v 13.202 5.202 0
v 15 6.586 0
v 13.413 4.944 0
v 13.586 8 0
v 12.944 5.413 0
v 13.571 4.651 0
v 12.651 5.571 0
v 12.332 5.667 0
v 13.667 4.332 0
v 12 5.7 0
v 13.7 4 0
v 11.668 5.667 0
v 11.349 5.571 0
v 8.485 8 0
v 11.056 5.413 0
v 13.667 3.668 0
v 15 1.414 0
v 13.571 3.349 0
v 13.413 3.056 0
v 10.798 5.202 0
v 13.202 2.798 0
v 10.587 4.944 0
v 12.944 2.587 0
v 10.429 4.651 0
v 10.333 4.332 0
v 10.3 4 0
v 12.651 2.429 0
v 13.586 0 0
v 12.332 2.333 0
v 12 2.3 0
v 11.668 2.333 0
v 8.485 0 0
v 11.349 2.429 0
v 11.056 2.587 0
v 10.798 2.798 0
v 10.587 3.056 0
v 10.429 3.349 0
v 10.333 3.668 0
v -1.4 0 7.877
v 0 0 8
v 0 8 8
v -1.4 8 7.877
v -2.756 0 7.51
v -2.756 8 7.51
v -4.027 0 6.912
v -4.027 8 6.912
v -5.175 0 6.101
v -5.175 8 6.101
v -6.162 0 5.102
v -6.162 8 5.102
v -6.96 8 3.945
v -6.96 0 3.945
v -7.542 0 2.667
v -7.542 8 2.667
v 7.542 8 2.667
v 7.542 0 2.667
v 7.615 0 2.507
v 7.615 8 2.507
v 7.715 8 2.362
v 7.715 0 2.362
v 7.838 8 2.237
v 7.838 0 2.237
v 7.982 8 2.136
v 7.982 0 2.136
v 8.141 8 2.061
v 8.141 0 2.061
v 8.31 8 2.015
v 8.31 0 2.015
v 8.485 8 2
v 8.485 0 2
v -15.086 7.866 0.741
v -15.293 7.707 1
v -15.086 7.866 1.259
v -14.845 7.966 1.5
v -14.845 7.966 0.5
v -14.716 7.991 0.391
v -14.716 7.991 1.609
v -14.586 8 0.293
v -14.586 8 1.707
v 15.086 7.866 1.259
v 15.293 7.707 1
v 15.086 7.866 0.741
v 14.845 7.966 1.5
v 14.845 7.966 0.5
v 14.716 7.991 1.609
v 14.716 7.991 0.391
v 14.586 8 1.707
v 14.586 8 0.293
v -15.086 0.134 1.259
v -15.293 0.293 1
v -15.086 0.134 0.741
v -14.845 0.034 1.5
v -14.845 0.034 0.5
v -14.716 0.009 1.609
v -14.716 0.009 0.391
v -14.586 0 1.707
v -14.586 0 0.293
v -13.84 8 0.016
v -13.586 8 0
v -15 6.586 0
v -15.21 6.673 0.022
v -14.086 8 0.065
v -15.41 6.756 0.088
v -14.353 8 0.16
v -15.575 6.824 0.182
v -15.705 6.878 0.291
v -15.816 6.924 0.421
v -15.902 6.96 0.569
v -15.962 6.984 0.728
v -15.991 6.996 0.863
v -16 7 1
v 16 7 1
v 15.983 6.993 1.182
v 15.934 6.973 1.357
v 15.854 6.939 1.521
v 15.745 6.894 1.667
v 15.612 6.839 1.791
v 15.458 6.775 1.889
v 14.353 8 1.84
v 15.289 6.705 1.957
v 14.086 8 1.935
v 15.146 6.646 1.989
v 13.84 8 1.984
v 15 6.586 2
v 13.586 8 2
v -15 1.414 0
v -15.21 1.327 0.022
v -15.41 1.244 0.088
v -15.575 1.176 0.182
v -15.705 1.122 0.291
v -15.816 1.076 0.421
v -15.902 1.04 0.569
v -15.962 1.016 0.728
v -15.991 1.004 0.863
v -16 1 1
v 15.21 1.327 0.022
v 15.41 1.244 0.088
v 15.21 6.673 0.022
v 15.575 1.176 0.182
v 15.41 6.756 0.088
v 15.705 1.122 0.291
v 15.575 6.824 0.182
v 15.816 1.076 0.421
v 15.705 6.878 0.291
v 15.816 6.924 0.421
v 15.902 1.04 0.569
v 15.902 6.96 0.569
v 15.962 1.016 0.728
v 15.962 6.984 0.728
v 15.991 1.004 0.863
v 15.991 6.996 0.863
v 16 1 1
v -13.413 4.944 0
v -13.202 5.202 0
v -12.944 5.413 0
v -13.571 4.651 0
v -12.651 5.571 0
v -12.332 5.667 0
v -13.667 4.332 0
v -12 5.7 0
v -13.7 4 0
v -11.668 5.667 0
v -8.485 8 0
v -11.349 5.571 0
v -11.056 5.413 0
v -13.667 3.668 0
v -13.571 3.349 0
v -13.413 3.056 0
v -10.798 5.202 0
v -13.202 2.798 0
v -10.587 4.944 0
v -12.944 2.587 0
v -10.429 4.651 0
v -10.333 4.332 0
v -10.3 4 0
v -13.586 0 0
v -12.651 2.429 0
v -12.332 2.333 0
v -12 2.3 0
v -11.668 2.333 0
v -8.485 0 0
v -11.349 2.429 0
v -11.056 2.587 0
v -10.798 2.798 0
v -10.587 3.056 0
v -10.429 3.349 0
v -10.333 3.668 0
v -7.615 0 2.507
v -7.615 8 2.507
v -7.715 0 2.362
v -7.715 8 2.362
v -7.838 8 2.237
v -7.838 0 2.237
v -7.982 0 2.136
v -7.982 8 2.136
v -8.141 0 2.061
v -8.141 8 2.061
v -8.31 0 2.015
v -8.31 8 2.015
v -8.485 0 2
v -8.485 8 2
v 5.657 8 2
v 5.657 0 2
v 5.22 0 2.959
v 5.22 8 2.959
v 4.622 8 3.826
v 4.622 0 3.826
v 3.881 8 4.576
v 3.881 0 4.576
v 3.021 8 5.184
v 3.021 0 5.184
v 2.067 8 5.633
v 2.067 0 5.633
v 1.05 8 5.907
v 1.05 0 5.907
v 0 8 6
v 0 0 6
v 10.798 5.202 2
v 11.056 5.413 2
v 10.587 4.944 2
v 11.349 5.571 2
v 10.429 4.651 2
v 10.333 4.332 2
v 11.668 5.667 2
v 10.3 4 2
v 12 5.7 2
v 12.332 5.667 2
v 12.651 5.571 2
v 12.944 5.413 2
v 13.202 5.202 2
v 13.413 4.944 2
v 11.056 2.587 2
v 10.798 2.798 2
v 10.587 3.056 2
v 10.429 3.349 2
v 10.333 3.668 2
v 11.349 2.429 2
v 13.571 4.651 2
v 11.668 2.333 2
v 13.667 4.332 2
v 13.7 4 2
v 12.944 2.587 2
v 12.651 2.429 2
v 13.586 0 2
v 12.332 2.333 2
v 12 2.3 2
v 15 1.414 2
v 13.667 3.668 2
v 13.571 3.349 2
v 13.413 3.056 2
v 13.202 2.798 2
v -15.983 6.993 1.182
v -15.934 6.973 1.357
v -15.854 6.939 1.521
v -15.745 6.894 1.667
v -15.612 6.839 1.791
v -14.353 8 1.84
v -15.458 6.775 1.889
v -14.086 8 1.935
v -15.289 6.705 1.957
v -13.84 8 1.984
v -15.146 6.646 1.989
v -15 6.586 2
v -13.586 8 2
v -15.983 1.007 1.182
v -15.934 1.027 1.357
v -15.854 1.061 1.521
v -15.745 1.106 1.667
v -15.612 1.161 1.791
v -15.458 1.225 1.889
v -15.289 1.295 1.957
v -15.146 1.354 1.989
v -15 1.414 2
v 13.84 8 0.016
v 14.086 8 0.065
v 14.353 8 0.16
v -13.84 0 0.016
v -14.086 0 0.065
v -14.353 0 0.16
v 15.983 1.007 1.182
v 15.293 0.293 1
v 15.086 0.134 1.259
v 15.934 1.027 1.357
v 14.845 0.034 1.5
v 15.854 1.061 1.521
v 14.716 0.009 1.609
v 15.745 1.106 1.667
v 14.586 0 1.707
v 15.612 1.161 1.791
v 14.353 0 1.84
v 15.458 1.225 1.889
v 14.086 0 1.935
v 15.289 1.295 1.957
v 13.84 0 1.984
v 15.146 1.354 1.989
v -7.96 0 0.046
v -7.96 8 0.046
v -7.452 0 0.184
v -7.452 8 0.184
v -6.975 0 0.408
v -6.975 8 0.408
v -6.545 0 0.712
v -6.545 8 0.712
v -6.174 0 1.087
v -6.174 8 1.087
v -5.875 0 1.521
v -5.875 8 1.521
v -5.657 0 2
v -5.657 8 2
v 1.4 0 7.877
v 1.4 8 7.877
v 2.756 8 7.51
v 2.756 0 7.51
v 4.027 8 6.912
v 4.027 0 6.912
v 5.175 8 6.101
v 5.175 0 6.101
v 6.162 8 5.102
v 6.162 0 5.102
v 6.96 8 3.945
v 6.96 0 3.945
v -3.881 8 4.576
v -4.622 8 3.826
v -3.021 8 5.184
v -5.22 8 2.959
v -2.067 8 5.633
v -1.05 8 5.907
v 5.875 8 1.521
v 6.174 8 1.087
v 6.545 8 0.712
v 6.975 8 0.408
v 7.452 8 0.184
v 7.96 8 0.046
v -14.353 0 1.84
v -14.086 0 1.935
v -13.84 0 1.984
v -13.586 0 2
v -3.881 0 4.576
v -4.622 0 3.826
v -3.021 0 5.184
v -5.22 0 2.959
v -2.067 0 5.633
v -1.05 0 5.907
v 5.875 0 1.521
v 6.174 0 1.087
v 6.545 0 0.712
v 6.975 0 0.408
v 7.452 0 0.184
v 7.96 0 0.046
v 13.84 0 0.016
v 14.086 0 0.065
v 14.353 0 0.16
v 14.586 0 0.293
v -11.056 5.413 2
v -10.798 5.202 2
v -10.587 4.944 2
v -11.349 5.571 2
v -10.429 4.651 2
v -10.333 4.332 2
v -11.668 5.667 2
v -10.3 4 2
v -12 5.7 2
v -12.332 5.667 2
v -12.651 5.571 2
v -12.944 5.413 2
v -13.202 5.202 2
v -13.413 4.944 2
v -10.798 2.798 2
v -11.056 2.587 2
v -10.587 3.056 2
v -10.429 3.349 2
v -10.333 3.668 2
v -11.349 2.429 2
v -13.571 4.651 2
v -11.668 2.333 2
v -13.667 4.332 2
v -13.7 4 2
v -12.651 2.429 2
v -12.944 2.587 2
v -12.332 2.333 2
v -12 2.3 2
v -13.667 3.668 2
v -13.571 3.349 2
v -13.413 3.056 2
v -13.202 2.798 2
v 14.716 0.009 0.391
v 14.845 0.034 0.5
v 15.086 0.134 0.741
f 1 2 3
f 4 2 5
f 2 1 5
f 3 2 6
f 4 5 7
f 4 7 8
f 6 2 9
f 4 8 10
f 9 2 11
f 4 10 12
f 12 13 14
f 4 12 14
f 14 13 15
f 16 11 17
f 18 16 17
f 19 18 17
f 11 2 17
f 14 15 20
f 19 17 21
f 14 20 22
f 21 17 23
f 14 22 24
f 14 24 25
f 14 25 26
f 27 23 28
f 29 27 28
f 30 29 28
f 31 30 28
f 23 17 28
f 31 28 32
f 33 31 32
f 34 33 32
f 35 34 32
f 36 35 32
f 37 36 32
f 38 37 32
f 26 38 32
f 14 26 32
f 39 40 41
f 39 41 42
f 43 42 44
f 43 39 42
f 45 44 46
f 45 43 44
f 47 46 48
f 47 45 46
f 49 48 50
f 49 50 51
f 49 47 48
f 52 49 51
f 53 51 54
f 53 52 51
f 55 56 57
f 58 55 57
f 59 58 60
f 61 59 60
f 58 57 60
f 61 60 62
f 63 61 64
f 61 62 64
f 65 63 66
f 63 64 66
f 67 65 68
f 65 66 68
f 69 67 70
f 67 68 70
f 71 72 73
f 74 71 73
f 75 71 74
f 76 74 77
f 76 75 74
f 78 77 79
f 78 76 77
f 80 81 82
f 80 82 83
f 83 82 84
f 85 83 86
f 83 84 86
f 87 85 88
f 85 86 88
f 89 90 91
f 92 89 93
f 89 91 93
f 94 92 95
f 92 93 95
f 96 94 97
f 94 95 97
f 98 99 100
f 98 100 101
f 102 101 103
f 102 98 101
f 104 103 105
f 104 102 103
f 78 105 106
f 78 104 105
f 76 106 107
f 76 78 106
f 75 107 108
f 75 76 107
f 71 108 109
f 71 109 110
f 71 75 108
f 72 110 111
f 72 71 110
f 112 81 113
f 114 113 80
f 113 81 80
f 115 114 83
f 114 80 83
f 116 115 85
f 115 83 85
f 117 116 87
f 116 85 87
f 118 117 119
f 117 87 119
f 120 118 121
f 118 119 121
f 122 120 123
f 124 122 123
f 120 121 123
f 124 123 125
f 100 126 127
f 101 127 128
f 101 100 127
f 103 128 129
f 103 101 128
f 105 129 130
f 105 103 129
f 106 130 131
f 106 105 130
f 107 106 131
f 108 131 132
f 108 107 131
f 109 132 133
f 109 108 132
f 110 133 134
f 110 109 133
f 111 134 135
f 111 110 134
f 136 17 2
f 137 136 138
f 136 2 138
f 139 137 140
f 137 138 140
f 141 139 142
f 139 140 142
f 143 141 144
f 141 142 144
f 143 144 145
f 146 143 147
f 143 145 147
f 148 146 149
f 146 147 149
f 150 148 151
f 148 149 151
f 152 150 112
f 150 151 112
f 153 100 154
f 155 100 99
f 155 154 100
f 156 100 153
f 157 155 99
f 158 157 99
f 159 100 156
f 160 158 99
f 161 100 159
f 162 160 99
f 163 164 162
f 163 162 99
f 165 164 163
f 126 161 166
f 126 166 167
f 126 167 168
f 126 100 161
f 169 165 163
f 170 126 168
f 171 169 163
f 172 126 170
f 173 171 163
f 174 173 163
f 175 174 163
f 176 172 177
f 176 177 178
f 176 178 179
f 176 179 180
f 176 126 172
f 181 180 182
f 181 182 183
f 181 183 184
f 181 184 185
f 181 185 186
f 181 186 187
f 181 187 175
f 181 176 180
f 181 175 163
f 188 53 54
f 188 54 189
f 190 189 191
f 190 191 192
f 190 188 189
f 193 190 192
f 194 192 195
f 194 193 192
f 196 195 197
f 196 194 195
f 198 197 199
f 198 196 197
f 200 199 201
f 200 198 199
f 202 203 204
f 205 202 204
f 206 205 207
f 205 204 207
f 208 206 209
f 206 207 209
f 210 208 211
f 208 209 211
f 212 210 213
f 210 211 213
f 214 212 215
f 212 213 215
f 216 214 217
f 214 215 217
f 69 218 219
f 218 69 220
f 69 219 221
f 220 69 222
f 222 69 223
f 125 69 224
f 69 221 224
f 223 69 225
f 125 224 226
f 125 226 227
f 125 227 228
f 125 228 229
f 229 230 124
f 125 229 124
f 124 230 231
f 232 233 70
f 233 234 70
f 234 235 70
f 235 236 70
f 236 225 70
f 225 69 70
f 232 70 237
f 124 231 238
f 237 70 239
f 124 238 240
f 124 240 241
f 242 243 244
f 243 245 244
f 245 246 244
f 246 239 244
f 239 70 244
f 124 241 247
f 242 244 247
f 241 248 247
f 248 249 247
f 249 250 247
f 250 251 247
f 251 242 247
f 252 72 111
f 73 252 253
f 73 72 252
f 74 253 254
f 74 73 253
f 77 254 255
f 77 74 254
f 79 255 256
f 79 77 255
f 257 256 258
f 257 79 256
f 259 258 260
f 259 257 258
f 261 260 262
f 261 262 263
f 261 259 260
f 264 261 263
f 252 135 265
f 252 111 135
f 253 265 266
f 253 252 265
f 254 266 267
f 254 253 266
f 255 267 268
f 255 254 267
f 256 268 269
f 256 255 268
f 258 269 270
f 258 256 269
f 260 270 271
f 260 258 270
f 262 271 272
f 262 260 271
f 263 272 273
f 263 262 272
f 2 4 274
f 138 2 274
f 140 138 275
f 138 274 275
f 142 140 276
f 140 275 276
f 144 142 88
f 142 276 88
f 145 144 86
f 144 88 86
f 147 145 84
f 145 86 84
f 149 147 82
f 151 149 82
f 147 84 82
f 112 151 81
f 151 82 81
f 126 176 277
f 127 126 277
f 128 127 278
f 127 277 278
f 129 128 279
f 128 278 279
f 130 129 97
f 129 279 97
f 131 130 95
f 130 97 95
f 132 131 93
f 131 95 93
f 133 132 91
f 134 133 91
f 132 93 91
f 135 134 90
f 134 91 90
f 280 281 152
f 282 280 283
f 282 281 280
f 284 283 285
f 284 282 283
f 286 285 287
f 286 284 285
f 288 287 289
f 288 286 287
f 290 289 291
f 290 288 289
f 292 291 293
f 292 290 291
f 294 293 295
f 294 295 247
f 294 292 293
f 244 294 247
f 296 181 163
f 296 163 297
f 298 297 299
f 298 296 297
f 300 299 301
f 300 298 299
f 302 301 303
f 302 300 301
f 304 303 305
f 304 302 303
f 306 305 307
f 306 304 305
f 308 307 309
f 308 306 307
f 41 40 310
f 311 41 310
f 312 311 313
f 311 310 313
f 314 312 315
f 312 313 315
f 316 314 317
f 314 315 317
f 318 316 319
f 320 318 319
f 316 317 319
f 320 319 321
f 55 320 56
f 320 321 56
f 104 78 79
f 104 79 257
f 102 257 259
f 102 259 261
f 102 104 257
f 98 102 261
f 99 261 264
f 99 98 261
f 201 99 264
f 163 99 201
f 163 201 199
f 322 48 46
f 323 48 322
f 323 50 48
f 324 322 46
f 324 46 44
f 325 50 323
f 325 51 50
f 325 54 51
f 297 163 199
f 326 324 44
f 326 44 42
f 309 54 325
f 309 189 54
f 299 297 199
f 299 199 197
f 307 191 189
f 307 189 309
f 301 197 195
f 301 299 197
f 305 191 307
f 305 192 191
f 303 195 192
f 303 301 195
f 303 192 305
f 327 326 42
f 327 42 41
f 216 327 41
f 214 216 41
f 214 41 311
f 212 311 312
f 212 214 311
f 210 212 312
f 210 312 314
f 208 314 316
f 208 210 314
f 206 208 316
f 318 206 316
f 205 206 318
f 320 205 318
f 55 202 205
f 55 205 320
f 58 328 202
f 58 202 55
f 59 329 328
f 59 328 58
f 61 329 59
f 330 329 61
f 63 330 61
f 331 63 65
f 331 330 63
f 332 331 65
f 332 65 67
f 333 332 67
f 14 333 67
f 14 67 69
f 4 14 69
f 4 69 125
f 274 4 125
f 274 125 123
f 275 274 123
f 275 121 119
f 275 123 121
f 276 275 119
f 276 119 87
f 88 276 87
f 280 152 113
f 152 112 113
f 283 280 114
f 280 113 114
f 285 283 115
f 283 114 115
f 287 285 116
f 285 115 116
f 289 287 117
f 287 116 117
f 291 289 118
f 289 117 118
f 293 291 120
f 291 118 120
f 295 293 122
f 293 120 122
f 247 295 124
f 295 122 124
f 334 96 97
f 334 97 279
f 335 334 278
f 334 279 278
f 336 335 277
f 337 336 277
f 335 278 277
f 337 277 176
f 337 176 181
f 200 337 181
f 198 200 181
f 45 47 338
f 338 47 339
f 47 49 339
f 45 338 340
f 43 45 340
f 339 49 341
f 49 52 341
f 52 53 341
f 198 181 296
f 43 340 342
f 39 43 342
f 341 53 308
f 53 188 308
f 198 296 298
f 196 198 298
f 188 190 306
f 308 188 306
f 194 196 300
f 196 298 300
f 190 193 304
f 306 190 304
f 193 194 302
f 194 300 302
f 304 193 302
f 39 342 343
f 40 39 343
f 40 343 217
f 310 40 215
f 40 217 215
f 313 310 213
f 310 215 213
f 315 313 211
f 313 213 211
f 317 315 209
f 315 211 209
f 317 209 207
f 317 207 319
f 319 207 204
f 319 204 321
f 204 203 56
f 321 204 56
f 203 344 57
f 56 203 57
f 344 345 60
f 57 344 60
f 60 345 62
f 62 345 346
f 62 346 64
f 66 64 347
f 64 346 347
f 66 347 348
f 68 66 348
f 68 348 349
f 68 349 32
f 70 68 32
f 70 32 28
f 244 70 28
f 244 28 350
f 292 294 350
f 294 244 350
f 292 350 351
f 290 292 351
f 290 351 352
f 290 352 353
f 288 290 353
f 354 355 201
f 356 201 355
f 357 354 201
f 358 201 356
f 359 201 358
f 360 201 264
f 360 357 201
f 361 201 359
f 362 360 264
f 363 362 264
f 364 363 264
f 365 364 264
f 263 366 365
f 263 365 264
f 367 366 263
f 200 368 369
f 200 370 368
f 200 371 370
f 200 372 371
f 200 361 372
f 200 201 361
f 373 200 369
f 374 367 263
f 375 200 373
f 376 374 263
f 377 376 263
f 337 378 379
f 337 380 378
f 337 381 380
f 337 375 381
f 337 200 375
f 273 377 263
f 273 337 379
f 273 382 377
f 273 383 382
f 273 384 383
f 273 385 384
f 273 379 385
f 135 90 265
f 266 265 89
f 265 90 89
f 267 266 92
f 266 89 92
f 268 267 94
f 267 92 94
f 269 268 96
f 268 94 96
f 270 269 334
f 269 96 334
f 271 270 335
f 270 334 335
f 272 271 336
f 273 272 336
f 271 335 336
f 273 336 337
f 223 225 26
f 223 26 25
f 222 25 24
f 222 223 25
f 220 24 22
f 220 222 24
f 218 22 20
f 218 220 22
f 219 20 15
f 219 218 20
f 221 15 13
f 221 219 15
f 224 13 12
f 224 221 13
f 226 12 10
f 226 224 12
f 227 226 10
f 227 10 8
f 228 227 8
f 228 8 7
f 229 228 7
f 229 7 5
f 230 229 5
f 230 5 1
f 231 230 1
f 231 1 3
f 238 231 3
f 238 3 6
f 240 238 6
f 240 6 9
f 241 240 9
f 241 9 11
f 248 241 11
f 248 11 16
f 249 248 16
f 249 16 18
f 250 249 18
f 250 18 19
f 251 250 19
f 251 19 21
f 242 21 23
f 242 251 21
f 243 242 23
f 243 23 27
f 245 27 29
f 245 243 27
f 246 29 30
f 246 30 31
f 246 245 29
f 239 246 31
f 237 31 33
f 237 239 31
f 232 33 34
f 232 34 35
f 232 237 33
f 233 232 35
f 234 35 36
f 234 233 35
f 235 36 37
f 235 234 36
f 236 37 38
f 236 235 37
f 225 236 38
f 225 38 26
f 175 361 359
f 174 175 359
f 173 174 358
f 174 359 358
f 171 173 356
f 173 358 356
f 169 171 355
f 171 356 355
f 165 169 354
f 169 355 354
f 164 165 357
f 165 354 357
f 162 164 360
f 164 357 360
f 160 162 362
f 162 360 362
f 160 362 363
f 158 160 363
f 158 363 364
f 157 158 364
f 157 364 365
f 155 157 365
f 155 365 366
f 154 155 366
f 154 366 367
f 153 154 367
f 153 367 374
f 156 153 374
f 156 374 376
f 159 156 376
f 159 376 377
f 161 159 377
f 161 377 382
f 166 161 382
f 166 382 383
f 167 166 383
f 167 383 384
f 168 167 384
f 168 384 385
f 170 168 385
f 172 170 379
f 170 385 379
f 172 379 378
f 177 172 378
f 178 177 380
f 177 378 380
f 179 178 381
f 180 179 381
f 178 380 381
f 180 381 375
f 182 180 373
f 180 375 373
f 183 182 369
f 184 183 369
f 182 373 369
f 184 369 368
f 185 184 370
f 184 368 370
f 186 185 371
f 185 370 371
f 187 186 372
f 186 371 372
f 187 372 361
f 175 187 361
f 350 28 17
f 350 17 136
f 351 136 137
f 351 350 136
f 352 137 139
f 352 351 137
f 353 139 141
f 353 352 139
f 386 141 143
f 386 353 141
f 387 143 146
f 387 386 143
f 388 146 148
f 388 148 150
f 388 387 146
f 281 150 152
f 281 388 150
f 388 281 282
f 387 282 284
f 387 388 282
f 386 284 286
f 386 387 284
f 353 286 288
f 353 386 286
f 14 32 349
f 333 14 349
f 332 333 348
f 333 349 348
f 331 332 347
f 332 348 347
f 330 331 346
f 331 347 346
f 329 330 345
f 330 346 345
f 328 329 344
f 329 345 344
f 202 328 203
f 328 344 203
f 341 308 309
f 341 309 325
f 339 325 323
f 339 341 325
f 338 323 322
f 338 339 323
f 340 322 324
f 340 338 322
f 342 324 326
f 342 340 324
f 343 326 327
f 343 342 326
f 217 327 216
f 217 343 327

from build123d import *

# Parameters (mm, degrees)
BOSS_EXTRUDE1_DEPTH = 8
SKETCH2_R           = 1.7
CUT_EXTRUDE1_DEPTH  = 19.867962264
CHAMFER1_SIZE       = 1
FILLET1_R           = 1


with BuildPart() as part:
    # Sketch1 → Boss-Extrude1 (new body)
    with BuildSketch(Plane(origin=(0, 0, 0), x_dir=(1, 0, 0), z_dir=(0, 1, 0))):
        with BuildLine():
            Line((-16, 0), (-8.485281374, 0))
            ThreePointArc((-8.485281374, 0), (-6.753230567, -0.550510257), (-5.656854249, -2))
            ThreePointArc((-5.656854249, -2), (-3.464101615, -4.898979486), (0, -6))
            Line((0, -6), (0, -8))
            ThreePointArc((0, -8), (-4.618802154, -6.531972647), (-7.542472333, -2.666666667))
            ThreePointArc((-7.542472333, -2.666666667), (-7.907931105, -2.183503419), (-8.485281374, -2))
            Line((-8.485281374, -2), (-16, -2))
            Line((-16, -2), (-16, 0))
        make_face()
    extrude(amount=BOSS_EXTRUDE1_DEPTH)

    # Sketch2 → Cut-Extrude1 (cut, through all)
    with BuildSketch(Plane.XY.offset(2)):
        with Locations((-12, 4)):
            Circle(SKETCH2_R)
    extrude(amount=-CUT_EXTRUDE1_DEPTH, mode=Mode.SUBTRACT)

    # Chamfer1
    chamfer1_edges = [part.edges().sort_by_distance(p)[0] for p in [
        (-16, 0, 1),
        (-16, 8, 1),
    ]]
    chamfer(chamfer1_edges, length=CHAMFER1_SIZE)

    # Fillet1
    fillet1_edges = [part.edges().sort_by_distance(p)[0] for p in [
        (-16, 4, 0),
        (-16, 4, 2),
        (-15.5, 0.5, 0),
        (-15.5, 0.5, 2),
        (-15.5, 7.5, 0),
        (-15.5, 7.5, 2),
        (-15, 8, 1),
        (-15, 0, 1),
    ]]
    fillet(fillet1_edges, radius=FILLET1_R - 0.0001)  # a hair under: the kernel refuses the full size

    # Mirror1: part across plane


with BuildPart() as part_1:
    add(part.part)
    add(part.part.mirror(Plane(origin=(0, 8, 6), x_dir=(0, 0, 1), z_dir=(-1, 0, 0))))


solid = part_1.part
